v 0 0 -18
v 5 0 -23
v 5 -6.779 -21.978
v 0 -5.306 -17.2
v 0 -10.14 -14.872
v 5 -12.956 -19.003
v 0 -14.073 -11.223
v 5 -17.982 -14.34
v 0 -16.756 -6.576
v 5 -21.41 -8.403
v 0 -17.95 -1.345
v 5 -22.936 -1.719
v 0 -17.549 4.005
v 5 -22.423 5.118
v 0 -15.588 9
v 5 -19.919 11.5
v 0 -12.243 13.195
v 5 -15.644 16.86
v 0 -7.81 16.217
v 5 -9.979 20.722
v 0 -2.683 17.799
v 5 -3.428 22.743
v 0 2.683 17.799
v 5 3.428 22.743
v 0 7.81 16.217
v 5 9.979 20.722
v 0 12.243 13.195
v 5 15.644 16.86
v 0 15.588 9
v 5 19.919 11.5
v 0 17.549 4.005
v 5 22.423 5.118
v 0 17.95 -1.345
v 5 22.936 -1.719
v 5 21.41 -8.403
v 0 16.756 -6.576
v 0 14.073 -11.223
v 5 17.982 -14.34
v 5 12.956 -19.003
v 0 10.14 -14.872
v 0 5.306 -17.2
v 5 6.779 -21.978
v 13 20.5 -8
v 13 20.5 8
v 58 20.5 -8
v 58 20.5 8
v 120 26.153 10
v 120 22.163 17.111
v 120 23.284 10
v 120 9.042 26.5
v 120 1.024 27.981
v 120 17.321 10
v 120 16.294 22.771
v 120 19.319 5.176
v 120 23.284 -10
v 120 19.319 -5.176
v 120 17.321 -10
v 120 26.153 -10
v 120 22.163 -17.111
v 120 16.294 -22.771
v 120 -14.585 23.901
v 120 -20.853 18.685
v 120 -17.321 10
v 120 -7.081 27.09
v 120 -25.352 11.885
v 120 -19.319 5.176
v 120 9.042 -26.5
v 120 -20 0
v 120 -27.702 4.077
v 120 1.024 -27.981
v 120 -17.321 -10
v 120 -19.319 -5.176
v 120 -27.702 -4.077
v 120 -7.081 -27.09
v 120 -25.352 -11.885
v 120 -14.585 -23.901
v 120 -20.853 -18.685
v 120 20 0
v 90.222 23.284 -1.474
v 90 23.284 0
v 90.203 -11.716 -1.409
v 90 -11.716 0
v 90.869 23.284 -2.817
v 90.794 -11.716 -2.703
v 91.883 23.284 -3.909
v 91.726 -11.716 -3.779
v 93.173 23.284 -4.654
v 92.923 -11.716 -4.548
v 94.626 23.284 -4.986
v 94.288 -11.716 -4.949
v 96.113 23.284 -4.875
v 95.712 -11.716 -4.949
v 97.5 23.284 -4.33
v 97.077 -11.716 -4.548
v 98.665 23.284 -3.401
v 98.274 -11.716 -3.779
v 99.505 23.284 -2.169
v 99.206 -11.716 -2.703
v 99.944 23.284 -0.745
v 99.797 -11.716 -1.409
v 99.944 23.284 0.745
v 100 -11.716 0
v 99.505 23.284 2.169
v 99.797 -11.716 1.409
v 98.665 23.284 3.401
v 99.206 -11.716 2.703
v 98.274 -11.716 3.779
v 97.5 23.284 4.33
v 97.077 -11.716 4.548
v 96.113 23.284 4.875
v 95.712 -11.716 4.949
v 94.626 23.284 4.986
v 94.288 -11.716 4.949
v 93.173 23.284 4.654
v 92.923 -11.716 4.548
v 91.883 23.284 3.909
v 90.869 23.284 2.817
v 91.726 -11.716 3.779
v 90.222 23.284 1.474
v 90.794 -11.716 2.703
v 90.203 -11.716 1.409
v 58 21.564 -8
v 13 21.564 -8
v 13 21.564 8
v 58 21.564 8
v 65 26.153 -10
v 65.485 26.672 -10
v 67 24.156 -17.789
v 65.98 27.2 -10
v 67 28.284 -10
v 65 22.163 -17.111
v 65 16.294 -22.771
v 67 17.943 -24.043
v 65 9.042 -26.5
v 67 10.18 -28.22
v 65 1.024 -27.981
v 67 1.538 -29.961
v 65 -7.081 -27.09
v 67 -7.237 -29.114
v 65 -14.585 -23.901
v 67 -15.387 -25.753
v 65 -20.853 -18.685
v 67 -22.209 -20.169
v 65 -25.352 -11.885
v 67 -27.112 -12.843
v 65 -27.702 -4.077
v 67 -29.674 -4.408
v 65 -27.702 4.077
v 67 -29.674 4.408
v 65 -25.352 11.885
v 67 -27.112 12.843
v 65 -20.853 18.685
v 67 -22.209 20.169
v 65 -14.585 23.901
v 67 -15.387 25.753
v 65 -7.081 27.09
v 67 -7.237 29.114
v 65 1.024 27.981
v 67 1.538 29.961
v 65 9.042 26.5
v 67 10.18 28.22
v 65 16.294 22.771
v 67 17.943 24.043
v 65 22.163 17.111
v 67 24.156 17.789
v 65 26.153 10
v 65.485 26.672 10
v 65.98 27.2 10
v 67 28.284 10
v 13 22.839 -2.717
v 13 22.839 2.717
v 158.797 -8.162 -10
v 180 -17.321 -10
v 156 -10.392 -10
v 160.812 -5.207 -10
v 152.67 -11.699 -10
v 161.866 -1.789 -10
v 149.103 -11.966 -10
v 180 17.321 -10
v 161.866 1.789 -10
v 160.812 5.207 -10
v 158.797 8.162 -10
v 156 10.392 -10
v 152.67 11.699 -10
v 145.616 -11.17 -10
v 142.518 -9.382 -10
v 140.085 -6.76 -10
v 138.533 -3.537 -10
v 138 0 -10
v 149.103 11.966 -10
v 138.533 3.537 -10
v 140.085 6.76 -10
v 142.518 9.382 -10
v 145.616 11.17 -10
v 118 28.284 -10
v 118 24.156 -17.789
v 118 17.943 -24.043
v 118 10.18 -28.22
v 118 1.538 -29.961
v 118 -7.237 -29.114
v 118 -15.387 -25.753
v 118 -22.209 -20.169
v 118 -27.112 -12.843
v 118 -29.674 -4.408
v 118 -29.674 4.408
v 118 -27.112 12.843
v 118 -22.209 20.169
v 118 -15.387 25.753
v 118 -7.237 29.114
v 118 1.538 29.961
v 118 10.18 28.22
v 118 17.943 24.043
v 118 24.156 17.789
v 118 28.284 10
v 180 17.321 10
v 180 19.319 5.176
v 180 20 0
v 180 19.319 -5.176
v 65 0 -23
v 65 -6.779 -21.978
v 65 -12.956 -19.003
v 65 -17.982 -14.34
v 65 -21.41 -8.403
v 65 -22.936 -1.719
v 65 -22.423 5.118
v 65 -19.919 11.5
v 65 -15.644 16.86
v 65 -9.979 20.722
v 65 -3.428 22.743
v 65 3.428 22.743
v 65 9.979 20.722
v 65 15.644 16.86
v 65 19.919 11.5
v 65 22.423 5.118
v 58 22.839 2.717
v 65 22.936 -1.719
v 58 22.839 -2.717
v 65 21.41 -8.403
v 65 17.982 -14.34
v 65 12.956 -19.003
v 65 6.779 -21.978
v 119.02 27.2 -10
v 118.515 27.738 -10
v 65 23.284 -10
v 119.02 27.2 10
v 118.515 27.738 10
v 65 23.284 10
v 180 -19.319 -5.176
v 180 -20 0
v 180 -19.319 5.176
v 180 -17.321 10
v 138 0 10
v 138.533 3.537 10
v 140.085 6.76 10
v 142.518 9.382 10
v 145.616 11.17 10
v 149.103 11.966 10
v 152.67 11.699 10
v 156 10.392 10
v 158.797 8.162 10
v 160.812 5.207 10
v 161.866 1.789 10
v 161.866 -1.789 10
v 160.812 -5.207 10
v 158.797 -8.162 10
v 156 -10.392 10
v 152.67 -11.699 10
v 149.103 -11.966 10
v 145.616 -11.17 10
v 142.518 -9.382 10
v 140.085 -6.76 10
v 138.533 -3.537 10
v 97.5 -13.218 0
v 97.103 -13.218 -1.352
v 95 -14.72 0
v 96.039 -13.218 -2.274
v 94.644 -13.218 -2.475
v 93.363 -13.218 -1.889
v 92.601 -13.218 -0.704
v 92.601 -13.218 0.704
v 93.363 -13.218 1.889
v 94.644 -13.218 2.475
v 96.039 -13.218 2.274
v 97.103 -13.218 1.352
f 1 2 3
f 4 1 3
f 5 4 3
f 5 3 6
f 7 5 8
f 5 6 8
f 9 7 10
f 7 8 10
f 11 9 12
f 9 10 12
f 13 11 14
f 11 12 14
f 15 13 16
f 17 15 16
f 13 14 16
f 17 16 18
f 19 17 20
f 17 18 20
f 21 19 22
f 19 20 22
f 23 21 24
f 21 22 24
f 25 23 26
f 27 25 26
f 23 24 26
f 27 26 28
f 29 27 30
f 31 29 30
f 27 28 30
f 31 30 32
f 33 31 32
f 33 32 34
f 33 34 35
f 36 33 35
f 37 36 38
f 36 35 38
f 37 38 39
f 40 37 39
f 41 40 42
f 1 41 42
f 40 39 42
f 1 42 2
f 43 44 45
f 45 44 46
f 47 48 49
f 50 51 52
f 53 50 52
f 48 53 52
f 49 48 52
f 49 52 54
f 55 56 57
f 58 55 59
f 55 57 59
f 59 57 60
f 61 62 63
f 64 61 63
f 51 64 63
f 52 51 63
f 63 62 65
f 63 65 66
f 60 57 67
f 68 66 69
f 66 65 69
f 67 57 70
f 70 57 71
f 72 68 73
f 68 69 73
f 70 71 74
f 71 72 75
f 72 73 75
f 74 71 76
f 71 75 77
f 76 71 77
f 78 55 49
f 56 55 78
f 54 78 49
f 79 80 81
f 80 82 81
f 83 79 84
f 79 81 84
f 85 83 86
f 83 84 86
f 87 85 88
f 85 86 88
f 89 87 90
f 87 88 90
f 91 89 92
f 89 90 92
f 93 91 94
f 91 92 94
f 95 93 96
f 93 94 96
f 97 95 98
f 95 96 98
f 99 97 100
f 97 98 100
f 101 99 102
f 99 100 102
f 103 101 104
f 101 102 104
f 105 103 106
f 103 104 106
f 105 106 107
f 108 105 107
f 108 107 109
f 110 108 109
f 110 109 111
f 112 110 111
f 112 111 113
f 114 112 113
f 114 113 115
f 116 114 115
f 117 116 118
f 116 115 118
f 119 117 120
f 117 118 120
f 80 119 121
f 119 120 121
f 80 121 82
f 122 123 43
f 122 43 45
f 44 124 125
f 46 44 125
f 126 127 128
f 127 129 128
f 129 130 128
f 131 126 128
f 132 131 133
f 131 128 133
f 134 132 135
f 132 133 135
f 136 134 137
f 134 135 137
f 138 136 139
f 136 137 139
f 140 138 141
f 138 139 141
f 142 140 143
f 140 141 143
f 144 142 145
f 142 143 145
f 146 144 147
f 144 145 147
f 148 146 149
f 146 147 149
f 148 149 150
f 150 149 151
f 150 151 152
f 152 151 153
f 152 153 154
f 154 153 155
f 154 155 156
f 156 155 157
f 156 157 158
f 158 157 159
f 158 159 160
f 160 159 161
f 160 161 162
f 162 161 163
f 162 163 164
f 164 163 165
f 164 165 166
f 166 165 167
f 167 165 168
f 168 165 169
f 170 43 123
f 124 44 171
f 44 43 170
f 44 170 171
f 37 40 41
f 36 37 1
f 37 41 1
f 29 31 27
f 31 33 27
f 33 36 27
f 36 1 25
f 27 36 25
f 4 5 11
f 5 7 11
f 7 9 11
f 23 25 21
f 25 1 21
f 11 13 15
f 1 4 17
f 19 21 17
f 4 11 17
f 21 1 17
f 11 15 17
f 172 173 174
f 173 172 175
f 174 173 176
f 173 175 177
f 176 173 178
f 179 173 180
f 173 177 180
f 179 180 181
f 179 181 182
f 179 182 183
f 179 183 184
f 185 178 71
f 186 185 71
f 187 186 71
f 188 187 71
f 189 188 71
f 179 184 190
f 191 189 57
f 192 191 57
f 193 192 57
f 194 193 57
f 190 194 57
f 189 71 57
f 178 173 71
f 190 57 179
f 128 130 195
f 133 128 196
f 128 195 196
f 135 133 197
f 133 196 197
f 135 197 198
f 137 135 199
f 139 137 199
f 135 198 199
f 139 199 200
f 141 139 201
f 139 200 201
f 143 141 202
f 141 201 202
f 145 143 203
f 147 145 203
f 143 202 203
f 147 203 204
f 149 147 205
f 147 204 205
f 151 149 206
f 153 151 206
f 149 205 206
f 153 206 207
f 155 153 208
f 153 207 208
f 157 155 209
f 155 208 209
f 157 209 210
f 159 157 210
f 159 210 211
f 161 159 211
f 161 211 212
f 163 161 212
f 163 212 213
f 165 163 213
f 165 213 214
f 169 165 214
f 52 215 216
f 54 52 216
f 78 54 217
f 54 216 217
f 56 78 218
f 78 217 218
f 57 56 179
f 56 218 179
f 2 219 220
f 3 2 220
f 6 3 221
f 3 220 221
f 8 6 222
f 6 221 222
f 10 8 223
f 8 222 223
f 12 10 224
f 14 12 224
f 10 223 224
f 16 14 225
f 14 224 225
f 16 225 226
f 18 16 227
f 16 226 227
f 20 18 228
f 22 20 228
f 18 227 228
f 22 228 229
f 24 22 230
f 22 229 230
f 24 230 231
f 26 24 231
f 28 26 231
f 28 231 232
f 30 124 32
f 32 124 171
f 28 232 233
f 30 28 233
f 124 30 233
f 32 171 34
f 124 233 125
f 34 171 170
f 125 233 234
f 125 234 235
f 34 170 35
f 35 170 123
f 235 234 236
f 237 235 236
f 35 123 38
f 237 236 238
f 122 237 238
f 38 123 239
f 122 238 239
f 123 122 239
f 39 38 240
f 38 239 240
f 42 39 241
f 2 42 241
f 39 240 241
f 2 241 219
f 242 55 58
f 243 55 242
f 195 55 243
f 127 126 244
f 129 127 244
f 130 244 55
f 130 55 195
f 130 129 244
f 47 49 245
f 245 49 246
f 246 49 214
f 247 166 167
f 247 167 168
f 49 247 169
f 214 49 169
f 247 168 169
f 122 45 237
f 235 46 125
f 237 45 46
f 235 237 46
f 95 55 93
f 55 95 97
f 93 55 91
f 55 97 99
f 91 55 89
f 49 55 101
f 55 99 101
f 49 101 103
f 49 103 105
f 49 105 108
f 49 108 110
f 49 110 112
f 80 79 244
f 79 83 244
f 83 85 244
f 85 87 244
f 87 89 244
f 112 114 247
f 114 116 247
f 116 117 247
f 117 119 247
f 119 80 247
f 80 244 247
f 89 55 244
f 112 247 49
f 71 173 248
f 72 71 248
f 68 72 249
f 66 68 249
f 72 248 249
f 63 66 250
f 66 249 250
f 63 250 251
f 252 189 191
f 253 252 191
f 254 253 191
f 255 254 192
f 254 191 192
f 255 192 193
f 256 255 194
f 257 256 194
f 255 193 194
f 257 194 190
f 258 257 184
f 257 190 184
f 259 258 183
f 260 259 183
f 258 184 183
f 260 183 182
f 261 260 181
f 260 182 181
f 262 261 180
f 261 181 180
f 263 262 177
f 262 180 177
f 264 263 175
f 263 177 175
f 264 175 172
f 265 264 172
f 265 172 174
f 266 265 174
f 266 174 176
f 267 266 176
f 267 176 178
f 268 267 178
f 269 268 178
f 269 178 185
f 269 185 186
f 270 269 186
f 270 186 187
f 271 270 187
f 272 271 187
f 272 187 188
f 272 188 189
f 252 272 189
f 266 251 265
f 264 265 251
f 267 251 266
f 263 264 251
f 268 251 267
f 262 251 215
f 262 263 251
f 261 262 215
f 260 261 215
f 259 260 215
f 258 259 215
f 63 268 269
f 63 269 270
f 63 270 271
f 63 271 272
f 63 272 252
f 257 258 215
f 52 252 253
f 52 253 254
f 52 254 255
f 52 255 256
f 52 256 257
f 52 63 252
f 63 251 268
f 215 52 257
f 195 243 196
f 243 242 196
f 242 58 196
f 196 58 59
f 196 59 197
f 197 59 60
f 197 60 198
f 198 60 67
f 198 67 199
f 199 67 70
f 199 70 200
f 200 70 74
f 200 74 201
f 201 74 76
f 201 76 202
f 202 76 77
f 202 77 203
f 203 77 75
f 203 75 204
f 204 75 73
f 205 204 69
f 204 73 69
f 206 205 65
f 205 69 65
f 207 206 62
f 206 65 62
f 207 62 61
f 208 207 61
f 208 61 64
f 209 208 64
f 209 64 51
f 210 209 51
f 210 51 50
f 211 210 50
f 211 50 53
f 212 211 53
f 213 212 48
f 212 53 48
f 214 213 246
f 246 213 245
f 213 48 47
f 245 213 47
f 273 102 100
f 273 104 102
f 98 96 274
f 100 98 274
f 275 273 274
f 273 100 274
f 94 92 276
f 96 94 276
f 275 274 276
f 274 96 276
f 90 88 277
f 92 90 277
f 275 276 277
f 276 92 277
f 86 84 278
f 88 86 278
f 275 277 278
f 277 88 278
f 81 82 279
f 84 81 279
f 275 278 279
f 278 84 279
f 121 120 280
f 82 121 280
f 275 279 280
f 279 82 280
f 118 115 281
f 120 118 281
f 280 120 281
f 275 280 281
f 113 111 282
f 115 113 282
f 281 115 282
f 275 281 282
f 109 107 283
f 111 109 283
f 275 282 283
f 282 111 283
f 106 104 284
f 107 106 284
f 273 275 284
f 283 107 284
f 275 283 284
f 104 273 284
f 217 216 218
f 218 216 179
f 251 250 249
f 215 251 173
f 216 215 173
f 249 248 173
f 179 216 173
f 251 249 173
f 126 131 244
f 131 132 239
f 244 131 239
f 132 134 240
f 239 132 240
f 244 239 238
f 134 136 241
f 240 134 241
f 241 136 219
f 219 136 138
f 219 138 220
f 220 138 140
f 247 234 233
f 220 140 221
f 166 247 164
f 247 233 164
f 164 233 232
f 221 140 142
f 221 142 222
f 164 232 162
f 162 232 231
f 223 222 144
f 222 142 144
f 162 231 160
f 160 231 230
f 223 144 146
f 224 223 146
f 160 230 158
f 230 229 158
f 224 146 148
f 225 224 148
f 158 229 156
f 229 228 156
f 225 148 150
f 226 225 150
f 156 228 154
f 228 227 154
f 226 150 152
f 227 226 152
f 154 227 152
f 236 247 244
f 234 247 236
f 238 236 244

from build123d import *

# Parameters (mm, degrees)
SKETCH_2_W                  = 45
SKETCH_2_H                  = 2.5
CUT_EXTRUDE_1_DEPTH         = 8
SKETCH_4_W                  = 20
SKETCH_4_H                  = 6.715728753
CUT_EXTRUDE_2_DEPTH         = 123.576506721
HOLE_WIZARD_10_0_10_1_D     = 10
HOLE_WIZARD_10_0_10_1_DEPTH = 35
HOLE_WIZARD_10_0_10_1_TIP   = 3.004303095
CUT_EXTRUDE_START           = -60
CUT_EXTRUDE_3_DEPTH         = 245.932420089
HOLE_WIZARD_24_0_24_1_D     = 24
CHAMFER_1_SIZE              = 5
CHAMFER_2_SIZE              = 2


with BuildPart() as part:
    # Эскиз1 → Повернуть1 (revolve)
    with BuildSketch(Plane.XY, mode=Mode.PRIVATE) as revolve_1_sk:
        Polygon((0, 0), (0, 23), (65, 23), (65, 30), (120, 30), (120, 20), (180, 20), (180, 0), align=None)
    revolve(revolve_1_sk.sketch.rotate(Axis((0, 0, 0), (-1, 0, 0)), 90), axis=Axis((0, 0, 0), (-1, 0, 0)))

    # Эскиз2 → Вырез-Вытянуть1 (cut, symmetric)
    with BuildSketch(Plane.XY):
        with Locations((35.5, 21.75)):
            Rectangle(SKETCH_2_W, SKETCH_2_H)
    extrude(amount=CUT_EXTRUDE_1_DEPTH, both=True, mode=Mode.SUBTRACT)

    # Эскиз4 → Вырез-Вытянуть2 (cut, through all)
    with BuildSketch(Plane.ZY.offset(-65)):
        with Locations((0, 26.642135624)):
            Rectangle(SKETCH_4_W, SKETCH_4_H)
    extrude(amount=-CUT_EXTRUDE_2_DEPTH, mode=Mode.SUBTRACT)

    # Диаметр отверстия Ø10.0 (10)1
    with Locations(Plane(origin=(0, 23.284271247, 0), x_dir=(1, 0, 0), z_dir=(0, 1, 0))):
        with Locations((95, 0)):
            Hole(HOLE_WIZARD_10_0_10_1_D / 2, depth=HOLE_WIZARD_10_0_10_1_DEPTH)
            with Locations((0, 0, -(HOLE_WIZARD_10_0_10_1_DEPTH + HOLE_WIZARD_10_0_10_1_TIP / 2))):  # 118° drill point
                Cone(0, HOLE_WIZARD_10_0_10_1_D / 2, HOLE_WIZARD_10_0_10_1_TIP, mode=Mode.SUBTRACT)

    # Эскиз7 → Вырез-Вытянуть3 (cut)
    with BuildSketch(Plane(origin=(180, 0, 0), x_dir=(0, 0, -1), z_dir=(1, 0, 0)).offset(CUT_EXTRUDE_START)):
        Polygon((-10, 151.24355653), (-10, 17.320508076), (-10, -17.320508076), (-10, -151.24355653), (-277.846096908, -151.24355653), (-277.846096908, 151.24355653), align=None)
    cut_extrude_3 = extrude(amount=CUT_EXTRUDE_3_DEPTH, mode=Mode.SUBTRACT)

    # Зеркальное отражение1: Вырез-Вытянуть3 across plane
    add(cut_extrude_3.mirror(Plane.XY), mode=Mode.SUBTRACT)

    # Диаметр отверстия Ø24.0 (24)1 (through all)
    with Locations(Plane.XY.offset(10)):
        with Locations((150, 0)):
            Hole(HOLE_WIZARD_24_0_24_1_D / 2)

    # Фаска1
    chamfer_1_edges = [part.edges().sort_by_distance(p)[0] for p in [
        (0, 0, 23),
    ]]
    chamfer(chamfer_1_edges, length=CHAMFER_1_SIZE)

    # Фаска2
    chamfer_2_edges = [part.edges().sort_by_distance(p)[0] for p in [
        (120, -30, 0),
        (65, -30, 0),
    ]]
    chamfer(chamfer_2_edges, length=CHAMFER_2_SIZE)


solid = part.part
